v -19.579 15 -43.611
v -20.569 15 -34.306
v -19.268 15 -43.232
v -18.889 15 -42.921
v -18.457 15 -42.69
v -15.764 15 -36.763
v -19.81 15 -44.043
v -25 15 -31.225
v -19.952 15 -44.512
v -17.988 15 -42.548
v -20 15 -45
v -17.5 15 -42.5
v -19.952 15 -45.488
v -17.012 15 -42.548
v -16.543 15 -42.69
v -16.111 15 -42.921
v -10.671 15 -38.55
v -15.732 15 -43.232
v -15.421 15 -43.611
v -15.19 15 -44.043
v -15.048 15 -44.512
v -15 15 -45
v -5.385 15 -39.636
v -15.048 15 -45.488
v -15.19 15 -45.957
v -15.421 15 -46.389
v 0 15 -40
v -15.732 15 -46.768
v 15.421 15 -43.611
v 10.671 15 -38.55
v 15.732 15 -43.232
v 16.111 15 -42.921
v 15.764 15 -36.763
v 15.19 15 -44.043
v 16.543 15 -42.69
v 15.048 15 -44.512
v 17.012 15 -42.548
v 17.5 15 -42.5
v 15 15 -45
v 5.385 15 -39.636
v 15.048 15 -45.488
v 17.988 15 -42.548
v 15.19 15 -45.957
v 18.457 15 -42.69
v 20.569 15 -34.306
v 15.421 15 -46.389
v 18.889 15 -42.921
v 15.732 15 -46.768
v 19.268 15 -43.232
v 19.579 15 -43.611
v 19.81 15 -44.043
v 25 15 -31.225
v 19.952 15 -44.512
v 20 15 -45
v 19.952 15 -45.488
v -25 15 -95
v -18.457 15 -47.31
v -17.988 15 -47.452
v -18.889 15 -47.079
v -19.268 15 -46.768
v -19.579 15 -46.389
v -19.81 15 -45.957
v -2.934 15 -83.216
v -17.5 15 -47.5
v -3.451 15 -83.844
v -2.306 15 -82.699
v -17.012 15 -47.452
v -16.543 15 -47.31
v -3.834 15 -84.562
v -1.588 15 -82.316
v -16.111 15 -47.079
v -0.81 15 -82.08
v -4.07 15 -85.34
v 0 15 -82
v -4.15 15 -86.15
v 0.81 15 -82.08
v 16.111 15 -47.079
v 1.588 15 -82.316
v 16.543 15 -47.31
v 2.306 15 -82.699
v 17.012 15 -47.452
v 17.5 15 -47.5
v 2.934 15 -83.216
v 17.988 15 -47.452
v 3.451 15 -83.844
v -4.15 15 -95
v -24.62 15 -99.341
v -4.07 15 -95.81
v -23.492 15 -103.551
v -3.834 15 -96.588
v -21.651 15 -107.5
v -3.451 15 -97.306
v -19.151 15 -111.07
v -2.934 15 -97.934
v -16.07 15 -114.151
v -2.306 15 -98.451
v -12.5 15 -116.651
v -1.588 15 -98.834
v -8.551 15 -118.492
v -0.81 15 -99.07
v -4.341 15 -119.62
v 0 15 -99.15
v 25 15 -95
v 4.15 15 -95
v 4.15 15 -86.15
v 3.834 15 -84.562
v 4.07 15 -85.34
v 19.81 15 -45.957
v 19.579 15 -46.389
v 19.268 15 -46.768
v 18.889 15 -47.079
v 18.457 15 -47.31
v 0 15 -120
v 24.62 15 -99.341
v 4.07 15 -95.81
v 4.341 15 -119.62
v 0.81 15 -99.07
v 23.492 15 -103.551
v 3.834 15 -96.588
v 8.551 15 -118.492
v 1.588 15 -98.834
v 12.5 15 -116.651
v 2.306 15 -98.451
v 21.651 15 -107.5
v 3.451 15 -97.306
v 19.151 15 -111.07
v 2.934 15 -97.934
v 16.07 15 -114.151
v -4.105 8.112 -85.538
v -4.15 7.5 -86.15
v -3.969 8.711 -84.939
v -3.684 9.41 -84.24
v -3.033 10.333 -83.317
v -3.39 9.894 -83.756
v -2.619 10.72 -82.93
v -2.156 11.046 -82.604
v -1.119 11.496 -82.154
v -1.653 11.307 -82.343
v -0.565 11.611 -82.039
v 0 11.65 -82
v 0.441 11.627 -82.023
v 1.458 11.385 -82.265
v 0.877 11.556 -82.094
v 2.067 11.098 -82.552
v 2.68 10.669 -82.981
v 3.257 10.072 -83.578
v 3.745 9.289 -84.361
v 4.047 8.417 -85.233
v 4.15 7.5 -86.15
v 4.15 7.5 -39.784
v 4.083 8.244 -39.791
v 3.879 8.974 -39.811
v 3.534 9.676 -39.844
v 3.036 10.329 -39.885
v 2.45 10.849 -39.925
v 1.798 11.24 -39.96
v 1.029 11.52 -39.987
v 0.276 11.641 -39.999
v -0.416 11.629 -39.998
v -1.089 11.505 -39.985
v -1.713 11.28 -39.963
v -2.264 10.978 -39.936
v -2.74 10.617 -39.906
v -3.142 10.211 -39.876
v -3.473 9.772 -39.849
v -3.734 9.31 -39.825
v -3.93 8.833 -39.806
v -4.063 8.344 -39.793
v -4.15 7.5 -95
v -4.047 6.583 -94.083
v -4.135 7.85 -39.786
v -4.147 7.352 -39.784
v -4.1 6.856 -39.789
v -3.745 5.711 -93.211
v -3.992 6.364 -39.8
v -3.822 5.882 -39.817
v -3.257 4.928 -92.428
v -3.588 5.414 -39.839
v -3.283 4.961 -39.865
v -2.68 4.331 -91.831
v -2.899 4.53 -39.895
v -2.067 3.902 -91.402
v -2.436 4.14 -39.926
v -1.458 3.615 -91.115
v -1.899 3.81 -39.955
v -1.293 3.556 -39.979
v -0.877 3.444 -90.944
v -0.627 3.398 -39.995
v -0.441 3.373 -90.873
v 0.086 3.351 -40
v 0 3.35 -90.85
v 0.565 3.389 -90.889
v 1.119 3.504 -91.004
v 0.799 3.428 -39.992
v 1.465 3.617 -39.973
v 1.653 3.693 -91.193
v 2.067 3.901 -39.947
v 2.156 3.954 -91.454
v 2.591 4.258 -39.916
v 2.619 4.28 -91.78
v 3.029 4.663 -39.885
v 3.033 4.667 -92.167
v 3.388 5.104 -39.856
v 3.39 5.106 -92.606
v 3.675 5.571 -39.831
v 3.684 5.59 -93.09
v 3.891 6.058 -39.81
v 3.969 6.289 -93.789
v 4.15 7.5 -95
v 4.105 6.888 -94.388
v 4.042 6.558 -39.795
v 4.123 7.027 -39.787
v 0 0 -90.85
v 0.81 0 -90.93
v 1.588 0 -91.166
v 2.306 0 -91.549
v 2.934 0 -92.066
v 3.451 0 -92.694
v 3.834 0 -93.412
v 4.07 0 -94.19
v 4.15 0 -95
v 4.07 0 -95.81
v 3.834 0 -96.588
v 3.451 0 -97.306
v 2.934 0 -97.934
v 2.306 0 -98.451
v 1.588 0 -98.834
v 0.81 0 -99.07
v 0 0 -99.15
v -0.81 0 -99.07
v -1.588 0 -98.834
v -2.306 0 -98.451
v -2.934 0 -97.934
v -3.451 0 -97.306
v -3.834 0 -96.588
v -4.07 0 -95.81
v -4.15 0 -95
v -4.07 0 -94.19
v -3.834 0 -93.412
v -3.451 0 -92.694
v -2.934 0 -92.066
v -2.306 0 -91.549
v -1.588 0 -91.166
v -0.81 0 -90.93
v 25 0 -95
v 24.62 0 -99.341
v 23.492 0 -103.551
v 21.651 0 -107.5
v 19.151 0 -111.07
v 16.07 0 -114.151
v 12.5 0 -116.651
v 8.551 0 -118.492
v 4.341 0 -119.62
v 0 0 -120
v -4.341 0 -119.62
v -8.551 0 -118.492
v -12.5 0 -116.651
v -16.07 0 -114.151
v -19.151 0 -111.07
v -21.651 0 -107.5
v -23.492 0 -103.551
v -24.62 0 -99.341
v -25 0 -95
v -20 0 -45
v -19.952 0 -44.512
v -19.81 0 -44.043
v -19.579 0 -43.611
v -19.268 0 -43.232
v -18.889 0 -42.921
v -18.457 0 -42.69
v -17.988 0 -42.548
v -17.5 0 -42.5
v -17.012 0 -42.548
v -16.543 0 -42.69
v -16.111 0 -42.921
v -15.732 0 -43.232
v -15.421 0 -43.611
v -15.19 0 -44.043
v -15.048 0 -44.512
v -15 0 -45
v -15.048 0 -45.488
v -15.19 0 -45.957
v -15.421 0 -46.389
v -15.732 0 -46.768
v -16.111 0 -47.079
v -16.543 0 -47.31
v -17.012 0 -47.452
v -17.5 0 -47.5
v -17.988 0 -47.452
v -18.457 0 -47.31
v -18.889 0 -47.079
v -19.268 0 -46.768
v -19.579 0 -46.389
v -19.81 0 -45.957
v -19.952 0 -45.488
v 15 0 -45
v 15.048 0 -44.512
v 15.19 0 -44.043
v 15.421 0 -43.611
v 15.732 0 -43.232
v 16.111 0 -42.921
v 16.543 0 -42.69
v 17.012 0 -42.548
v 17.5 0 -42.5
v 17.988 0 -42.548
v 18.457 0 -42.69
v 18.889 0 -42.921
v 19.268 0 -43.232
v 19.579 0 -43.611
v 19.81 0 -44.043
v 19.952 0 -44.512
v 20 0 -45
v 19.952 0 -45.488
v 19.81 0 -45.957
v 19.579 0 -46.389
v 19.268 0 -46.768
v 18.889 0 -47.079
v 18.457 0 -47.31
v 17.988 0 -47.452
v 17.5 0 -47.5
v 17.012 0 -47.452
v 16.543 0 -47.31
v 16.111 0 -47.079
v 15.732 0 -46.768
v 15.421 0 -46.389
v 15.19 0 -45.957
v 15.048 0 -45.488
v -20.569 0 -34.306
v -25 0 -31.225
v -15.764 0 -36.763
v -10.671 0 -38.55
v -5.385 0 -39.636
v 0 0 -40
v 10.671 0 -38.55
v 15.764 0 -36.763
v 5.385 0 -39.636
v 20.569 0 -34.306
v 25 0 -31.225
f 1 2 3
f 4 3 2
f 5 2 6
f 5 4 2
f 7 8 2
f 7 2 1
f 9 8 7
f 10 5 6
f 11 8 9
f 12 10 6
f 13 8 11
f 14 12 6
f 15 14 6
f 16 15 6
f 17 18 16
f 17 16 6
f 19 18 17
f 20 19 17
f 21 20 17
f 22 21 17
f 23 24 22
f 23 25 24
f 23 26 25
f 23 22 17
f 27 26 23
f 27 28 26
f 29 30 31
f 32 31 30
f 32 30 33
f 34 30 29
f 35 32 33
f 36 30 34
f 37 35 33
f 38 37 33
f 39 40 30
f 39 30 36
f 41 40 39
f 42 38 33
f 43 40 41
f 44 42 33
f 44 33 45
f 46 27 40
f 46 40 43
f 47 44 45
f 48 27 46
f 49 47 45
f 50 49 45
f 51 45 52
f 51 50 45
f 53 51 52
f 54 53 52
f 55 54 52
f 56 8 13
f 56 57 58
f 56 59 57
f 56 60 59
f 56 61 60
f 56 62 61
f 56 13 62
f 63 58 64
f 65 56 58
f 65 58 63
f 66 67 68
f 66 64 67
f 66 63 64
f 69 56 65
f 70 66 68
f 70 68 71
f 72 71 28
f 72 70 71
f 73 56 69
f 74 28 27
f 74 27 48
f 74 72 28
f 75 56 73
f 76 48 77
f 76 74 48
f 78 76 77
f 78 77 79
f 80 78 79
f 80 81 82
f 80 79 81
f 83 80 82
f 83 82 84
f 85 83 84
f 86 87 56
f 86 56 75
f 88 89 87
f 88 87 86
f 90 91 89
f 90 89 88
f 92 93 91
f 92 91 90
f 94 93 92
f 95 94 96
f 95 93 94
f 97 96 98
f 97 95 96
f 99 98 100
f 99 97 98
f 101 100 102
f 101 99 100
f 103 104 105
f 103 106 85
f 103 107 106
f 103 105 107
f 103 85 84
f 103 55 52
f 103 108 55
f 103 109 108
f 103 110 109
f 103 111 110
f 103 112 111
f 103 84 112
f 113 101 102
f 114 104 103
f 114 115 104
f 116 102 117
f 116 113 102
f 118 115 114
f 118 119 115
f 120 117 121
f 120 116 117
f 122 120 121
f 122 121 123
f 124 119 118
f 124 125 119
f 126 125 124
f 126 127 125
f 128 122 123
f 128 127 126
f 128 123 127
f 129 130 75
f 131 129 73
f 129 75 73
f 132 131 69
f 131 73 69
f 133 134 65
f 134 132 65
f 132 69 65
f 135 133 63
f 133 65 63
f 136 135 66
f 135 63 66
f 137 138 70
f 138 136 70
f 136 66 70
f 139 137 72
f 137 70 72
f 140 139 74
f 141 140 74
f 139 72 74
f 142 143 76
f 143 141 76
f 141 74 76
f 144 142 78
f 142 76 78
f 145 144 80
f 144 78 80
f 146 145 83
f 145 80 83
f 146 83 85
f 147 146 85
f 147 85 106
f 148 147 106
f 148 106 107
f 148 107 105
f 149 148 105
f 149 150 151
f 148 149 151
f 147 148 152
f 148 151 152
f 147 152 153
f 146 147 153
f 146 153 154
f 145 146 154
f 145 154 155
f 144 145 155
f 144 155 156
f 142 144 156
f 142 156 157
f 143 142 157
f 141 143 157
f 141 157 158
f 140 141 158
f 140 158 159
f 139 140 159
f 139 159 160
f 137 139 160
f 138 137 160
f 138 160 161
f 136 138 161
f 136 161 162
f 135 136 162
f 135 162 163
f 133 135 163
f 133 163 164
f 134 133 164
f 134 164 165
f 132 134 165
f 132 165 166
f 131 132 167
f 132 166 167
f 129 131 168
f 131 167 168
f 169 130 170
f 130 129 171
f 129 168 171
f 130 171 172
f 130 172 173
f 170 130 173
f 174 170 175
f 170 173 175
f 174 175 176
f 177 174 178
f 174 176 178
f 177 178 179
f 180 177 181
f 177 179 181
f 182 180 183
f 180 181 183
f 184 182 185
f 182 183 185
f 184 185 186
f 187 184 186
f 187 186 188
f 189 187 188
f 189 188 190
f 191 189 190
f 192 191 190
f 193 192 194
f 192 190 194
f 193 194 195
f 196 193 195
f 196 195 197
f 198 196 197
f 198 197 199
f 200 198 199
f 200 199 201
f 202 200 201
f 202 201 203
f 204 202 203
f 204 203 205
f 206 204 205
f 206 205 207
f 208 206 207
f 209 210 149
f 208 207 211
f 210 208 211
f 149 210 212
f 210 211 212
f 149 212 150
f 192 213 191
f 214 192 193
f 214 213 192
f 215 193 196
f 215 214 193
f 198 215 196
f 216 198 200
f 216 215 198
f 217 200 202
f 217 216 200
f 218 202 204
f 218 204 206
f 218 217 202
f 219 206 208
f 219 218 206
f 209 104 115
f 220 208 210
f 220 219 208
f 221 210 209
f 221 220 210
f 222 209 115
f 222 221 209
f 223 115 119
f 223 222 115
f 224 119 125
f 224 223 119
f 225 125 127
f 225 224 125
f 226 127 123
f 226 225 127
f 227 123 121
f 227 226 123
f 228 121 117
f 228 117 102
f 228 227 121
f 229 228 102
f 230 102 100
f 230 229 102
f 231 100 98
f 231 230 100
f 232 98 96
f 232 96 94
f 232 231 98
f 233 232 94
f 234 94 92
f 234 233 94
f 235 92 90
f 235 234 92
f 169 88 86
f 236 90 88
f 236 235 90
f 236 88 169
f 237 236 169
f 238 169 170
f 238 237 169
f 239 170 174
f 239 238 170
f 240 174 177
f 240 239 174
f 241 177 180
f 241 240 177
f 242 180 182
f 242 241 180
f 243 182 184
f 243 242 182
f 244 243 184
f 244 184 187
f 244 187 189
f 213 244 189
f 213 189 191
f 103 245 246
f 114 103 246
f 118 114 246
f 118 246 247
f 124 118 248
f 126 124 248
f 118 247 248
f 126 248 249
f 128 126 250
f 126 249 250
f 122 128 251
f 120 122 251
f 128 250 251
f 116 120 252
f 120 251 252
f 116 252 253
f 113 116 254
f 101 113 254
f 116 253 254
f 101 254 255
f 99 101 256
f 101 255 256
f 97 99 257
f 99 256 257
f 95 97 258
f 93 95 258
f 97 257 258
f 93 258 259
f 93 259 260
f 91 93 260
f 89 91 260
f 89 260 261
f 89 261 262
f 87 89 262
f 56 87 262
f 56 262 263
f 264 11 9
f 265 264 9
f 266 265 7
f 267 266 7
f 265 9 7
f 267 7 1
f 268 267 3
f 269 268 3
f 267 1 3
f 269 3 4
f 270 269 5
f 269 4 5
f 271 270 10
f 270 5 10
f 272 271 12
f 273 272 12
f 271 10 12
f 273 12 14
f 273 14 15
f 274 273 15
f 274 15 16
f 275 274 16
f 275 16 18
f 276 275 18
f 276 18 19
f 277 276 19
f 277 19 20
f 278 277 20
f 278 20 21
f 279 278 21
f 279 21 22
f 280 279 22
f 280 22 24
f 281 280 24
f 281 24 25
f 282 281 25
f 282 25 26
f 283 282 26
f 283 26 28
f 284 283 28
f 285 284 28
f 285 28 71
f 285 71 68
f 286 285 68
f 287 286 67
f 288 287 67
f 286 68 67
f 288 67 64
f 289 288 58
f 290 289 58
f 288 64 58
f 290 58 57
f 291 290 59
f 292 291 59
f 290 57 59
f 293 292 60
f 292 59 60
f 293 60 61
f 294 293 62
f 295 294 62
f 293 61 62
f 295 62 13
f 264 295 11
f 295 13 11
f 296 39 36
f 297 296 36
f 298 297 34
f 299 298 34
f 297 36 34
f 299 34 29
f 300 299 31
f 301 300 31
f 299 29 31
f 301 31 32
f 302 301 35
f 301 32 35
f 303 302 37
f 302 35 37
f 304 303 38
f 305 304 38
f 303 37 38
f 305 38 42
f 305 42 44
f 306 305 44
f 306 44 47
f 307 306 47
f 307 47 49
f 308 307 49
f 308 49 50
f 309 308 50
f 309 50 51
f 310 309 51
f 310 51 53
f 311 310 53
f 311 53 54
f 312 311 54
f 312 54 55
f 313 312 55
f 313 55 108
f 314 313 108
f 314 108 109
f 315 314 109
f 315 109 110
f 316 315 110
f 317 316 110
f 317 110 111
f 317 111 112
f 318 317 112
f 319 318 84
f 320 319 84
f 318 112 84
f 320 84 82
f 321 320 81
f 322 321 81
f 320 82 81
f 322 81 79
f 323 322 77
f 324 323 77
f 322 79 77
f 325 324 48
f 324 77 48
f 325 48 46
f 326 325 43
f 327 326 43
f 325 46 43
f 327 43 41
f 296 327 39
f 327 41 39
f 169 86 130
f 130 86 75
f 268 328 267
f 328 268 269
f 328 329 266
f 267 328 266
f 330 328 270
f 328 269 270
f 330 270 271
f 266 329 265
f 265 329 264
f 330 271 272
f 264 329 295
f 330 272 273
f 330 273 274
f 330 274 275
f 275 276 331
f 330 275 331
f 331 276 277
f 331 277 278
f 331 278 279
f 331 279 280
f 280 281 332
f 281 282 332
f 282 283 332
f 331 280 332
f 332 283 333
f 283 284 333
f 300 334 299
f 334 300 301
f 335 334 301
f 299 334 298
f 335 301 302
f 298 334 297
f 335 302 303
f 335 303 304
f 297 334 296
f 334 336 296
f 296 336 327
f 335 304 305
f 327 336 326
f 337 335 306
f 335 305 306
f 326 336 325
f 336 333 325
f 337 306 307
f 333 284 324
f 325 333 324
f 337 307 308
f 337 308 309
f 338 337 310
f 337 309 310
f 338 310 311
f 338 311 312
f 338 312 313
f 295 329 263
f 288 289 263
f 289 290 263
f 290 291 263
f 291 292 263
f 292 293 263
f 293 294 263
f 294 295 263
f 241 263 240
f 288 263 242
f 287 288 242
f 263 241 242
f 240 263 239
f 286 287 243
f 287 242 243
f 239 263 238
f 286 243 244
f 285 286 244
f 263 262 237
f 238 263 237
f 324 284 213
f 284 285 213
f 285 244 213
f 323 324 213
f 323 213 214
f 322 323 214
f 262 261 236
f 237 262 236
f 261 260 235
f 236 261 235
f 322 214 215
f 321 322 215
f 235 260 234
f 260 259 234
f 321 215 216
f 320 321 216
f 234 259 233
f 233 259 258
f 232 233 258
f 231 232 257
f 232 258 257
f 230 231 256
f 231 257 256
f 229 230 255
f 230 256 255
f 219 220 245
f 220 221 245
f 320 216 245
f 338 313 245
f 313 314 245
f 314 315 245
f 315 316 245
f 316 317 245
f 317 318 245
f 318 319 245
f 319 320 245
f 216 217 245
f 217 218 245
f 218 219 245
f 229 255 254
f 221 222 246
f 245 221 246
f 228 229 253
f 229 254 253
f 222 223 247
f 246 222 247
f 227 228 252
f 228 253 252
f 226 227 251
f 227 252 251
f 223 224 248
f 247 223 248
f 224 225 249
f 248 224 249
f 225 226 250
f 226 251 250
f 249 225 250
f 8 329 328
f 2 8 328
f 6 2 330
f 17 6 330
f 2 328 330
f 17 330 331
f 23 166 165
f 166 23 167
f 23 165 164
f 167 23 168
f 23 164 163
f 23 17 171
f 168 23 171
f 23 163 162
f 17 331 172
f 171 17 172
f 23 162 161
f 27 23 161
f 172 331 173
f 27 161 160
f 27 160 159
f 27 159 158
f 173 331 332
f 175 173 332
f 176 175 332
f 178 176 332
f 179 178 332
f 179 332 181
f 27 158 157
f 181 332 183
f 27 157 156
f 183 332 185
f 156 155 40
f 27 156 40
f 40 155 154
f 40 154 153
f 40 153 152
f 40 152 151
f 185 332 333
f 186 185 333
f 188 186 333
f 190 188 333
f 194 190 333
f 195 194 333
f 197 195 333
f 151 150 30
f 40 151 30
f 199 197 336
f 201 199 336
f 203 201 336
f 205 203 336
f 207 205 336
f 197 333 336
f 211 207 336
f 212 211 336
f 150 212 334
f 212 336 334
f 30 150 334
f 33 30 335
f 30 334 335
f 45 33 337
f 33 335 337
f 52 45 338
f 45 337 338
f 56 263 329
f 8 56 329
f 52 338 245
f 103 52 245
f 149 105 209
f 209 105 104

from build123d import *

# Parameters (mm, degrees)
ESQUISSE1_R                  = 4.15
BOSS_EXTRU_1_DEPTH           = 15
ENL_V_MAT_EXTRU_1_REACH      = 122
ENL_V_MAT_EXTRU_1_END_RADIUS = 4.15
ESQUISSE2_R                  = 4.15
ENL_V_MAT_EXTRU_2_DEPTH      = 7.5
TROU_TARAUD_M6X1_01_D        = 5


with BuildPart() as part:
    # Esquisse1 → Boss.-Extru.1 (new body)
    with BuildSketch(Plane(origin=(0, 0, 0), x_dir=(1, 0, 0), z_dir=(0, 1, 0))):
        with BuildLine():
            Line((25, 31.224989992), (25, 95))
            ThreePointArc((25, 95), (0, 120), (-25, 95))
            Line((-25, 95), (-25, 31.224989992))
            ThreePointArc((-25, 31.224989992), (0, 40), (25, 31.224989992))
        make_face()
        with Locations(Location((0, 95, 0), (0, 0, 270))):  # turned: the seam where the file's is
            Circle(ESQUISSE1_R, mode=Mode.SUBTRACT)
    extrude(amount=BOSS_EXTRU_1_DEPTH)

    # Enlèv. mat.-Extru.1: up to this cylinder (the profile starts outside it)
    enl_v_mat_extru_1_end = Plane(origin=(0, 7.5, -95), z_dir=(0, -1, 0)) * Cylinder(ENL_V_MAT_EXTRU_1_END_RADIUS, 253.3, mode=Mode.PRIVATE)
    # Esquisse2 → Enlèv. mat.-Extru.1 (cut, up to the surface)
    with BuildSketch(Plane.XY, mode=Mode.PRIVATE) as enl_v_mat_extru_1_sk1:
        with Locations((0, 7.5)):
            Circle(ESQUISSE2_R)
    enl_v_mat_extru_1_tool1 = extrude(enl_v_mat_extru_1_sk1.sketch, amount=-ENL_V_MAT_EXTRU_1_REACH, mode=Mode.PRIVATE) - enl_v_mat_extru_1_end
    add(enl_v_mat_extru_1_tool1.solids().sort_by_distance((0, 7.5, 0))[0], mode=Mode.SUBTRACT)

    # Esquisse3 → Enlèv. mat.-Extru.2 (cut)
    with BuildSketch(Plane(origin=(0, 15, 0), x_dir=(-1, 0, 0), z_dir=(0, 1, 0))):
        with BuildLine():
            Line((4.15, -95), (4.15, -86.15))
            ThreePointArc((4.15, -86.15), (0, -82), (-4.15, -86.15))
            Line((-4.15, -86.15), (-4.15, -95))
            ThreePointArc((-4.15, -95), (0, -99.15), (4.15, -95))
        make_face()
    extrude(amount=-ENL_V_MAT_EXTRU_2_DEPTH, mode=Mode.SUBTRACT)

    # Trou taraudé M6x1.01 (through all)
    with Locations(Plane.XZ):
        with Locations((17.5, -45), (-17.5, -45)):
            Hole(TROU_TARAUD_M6X1_01_D / 2)


solid = part.part
